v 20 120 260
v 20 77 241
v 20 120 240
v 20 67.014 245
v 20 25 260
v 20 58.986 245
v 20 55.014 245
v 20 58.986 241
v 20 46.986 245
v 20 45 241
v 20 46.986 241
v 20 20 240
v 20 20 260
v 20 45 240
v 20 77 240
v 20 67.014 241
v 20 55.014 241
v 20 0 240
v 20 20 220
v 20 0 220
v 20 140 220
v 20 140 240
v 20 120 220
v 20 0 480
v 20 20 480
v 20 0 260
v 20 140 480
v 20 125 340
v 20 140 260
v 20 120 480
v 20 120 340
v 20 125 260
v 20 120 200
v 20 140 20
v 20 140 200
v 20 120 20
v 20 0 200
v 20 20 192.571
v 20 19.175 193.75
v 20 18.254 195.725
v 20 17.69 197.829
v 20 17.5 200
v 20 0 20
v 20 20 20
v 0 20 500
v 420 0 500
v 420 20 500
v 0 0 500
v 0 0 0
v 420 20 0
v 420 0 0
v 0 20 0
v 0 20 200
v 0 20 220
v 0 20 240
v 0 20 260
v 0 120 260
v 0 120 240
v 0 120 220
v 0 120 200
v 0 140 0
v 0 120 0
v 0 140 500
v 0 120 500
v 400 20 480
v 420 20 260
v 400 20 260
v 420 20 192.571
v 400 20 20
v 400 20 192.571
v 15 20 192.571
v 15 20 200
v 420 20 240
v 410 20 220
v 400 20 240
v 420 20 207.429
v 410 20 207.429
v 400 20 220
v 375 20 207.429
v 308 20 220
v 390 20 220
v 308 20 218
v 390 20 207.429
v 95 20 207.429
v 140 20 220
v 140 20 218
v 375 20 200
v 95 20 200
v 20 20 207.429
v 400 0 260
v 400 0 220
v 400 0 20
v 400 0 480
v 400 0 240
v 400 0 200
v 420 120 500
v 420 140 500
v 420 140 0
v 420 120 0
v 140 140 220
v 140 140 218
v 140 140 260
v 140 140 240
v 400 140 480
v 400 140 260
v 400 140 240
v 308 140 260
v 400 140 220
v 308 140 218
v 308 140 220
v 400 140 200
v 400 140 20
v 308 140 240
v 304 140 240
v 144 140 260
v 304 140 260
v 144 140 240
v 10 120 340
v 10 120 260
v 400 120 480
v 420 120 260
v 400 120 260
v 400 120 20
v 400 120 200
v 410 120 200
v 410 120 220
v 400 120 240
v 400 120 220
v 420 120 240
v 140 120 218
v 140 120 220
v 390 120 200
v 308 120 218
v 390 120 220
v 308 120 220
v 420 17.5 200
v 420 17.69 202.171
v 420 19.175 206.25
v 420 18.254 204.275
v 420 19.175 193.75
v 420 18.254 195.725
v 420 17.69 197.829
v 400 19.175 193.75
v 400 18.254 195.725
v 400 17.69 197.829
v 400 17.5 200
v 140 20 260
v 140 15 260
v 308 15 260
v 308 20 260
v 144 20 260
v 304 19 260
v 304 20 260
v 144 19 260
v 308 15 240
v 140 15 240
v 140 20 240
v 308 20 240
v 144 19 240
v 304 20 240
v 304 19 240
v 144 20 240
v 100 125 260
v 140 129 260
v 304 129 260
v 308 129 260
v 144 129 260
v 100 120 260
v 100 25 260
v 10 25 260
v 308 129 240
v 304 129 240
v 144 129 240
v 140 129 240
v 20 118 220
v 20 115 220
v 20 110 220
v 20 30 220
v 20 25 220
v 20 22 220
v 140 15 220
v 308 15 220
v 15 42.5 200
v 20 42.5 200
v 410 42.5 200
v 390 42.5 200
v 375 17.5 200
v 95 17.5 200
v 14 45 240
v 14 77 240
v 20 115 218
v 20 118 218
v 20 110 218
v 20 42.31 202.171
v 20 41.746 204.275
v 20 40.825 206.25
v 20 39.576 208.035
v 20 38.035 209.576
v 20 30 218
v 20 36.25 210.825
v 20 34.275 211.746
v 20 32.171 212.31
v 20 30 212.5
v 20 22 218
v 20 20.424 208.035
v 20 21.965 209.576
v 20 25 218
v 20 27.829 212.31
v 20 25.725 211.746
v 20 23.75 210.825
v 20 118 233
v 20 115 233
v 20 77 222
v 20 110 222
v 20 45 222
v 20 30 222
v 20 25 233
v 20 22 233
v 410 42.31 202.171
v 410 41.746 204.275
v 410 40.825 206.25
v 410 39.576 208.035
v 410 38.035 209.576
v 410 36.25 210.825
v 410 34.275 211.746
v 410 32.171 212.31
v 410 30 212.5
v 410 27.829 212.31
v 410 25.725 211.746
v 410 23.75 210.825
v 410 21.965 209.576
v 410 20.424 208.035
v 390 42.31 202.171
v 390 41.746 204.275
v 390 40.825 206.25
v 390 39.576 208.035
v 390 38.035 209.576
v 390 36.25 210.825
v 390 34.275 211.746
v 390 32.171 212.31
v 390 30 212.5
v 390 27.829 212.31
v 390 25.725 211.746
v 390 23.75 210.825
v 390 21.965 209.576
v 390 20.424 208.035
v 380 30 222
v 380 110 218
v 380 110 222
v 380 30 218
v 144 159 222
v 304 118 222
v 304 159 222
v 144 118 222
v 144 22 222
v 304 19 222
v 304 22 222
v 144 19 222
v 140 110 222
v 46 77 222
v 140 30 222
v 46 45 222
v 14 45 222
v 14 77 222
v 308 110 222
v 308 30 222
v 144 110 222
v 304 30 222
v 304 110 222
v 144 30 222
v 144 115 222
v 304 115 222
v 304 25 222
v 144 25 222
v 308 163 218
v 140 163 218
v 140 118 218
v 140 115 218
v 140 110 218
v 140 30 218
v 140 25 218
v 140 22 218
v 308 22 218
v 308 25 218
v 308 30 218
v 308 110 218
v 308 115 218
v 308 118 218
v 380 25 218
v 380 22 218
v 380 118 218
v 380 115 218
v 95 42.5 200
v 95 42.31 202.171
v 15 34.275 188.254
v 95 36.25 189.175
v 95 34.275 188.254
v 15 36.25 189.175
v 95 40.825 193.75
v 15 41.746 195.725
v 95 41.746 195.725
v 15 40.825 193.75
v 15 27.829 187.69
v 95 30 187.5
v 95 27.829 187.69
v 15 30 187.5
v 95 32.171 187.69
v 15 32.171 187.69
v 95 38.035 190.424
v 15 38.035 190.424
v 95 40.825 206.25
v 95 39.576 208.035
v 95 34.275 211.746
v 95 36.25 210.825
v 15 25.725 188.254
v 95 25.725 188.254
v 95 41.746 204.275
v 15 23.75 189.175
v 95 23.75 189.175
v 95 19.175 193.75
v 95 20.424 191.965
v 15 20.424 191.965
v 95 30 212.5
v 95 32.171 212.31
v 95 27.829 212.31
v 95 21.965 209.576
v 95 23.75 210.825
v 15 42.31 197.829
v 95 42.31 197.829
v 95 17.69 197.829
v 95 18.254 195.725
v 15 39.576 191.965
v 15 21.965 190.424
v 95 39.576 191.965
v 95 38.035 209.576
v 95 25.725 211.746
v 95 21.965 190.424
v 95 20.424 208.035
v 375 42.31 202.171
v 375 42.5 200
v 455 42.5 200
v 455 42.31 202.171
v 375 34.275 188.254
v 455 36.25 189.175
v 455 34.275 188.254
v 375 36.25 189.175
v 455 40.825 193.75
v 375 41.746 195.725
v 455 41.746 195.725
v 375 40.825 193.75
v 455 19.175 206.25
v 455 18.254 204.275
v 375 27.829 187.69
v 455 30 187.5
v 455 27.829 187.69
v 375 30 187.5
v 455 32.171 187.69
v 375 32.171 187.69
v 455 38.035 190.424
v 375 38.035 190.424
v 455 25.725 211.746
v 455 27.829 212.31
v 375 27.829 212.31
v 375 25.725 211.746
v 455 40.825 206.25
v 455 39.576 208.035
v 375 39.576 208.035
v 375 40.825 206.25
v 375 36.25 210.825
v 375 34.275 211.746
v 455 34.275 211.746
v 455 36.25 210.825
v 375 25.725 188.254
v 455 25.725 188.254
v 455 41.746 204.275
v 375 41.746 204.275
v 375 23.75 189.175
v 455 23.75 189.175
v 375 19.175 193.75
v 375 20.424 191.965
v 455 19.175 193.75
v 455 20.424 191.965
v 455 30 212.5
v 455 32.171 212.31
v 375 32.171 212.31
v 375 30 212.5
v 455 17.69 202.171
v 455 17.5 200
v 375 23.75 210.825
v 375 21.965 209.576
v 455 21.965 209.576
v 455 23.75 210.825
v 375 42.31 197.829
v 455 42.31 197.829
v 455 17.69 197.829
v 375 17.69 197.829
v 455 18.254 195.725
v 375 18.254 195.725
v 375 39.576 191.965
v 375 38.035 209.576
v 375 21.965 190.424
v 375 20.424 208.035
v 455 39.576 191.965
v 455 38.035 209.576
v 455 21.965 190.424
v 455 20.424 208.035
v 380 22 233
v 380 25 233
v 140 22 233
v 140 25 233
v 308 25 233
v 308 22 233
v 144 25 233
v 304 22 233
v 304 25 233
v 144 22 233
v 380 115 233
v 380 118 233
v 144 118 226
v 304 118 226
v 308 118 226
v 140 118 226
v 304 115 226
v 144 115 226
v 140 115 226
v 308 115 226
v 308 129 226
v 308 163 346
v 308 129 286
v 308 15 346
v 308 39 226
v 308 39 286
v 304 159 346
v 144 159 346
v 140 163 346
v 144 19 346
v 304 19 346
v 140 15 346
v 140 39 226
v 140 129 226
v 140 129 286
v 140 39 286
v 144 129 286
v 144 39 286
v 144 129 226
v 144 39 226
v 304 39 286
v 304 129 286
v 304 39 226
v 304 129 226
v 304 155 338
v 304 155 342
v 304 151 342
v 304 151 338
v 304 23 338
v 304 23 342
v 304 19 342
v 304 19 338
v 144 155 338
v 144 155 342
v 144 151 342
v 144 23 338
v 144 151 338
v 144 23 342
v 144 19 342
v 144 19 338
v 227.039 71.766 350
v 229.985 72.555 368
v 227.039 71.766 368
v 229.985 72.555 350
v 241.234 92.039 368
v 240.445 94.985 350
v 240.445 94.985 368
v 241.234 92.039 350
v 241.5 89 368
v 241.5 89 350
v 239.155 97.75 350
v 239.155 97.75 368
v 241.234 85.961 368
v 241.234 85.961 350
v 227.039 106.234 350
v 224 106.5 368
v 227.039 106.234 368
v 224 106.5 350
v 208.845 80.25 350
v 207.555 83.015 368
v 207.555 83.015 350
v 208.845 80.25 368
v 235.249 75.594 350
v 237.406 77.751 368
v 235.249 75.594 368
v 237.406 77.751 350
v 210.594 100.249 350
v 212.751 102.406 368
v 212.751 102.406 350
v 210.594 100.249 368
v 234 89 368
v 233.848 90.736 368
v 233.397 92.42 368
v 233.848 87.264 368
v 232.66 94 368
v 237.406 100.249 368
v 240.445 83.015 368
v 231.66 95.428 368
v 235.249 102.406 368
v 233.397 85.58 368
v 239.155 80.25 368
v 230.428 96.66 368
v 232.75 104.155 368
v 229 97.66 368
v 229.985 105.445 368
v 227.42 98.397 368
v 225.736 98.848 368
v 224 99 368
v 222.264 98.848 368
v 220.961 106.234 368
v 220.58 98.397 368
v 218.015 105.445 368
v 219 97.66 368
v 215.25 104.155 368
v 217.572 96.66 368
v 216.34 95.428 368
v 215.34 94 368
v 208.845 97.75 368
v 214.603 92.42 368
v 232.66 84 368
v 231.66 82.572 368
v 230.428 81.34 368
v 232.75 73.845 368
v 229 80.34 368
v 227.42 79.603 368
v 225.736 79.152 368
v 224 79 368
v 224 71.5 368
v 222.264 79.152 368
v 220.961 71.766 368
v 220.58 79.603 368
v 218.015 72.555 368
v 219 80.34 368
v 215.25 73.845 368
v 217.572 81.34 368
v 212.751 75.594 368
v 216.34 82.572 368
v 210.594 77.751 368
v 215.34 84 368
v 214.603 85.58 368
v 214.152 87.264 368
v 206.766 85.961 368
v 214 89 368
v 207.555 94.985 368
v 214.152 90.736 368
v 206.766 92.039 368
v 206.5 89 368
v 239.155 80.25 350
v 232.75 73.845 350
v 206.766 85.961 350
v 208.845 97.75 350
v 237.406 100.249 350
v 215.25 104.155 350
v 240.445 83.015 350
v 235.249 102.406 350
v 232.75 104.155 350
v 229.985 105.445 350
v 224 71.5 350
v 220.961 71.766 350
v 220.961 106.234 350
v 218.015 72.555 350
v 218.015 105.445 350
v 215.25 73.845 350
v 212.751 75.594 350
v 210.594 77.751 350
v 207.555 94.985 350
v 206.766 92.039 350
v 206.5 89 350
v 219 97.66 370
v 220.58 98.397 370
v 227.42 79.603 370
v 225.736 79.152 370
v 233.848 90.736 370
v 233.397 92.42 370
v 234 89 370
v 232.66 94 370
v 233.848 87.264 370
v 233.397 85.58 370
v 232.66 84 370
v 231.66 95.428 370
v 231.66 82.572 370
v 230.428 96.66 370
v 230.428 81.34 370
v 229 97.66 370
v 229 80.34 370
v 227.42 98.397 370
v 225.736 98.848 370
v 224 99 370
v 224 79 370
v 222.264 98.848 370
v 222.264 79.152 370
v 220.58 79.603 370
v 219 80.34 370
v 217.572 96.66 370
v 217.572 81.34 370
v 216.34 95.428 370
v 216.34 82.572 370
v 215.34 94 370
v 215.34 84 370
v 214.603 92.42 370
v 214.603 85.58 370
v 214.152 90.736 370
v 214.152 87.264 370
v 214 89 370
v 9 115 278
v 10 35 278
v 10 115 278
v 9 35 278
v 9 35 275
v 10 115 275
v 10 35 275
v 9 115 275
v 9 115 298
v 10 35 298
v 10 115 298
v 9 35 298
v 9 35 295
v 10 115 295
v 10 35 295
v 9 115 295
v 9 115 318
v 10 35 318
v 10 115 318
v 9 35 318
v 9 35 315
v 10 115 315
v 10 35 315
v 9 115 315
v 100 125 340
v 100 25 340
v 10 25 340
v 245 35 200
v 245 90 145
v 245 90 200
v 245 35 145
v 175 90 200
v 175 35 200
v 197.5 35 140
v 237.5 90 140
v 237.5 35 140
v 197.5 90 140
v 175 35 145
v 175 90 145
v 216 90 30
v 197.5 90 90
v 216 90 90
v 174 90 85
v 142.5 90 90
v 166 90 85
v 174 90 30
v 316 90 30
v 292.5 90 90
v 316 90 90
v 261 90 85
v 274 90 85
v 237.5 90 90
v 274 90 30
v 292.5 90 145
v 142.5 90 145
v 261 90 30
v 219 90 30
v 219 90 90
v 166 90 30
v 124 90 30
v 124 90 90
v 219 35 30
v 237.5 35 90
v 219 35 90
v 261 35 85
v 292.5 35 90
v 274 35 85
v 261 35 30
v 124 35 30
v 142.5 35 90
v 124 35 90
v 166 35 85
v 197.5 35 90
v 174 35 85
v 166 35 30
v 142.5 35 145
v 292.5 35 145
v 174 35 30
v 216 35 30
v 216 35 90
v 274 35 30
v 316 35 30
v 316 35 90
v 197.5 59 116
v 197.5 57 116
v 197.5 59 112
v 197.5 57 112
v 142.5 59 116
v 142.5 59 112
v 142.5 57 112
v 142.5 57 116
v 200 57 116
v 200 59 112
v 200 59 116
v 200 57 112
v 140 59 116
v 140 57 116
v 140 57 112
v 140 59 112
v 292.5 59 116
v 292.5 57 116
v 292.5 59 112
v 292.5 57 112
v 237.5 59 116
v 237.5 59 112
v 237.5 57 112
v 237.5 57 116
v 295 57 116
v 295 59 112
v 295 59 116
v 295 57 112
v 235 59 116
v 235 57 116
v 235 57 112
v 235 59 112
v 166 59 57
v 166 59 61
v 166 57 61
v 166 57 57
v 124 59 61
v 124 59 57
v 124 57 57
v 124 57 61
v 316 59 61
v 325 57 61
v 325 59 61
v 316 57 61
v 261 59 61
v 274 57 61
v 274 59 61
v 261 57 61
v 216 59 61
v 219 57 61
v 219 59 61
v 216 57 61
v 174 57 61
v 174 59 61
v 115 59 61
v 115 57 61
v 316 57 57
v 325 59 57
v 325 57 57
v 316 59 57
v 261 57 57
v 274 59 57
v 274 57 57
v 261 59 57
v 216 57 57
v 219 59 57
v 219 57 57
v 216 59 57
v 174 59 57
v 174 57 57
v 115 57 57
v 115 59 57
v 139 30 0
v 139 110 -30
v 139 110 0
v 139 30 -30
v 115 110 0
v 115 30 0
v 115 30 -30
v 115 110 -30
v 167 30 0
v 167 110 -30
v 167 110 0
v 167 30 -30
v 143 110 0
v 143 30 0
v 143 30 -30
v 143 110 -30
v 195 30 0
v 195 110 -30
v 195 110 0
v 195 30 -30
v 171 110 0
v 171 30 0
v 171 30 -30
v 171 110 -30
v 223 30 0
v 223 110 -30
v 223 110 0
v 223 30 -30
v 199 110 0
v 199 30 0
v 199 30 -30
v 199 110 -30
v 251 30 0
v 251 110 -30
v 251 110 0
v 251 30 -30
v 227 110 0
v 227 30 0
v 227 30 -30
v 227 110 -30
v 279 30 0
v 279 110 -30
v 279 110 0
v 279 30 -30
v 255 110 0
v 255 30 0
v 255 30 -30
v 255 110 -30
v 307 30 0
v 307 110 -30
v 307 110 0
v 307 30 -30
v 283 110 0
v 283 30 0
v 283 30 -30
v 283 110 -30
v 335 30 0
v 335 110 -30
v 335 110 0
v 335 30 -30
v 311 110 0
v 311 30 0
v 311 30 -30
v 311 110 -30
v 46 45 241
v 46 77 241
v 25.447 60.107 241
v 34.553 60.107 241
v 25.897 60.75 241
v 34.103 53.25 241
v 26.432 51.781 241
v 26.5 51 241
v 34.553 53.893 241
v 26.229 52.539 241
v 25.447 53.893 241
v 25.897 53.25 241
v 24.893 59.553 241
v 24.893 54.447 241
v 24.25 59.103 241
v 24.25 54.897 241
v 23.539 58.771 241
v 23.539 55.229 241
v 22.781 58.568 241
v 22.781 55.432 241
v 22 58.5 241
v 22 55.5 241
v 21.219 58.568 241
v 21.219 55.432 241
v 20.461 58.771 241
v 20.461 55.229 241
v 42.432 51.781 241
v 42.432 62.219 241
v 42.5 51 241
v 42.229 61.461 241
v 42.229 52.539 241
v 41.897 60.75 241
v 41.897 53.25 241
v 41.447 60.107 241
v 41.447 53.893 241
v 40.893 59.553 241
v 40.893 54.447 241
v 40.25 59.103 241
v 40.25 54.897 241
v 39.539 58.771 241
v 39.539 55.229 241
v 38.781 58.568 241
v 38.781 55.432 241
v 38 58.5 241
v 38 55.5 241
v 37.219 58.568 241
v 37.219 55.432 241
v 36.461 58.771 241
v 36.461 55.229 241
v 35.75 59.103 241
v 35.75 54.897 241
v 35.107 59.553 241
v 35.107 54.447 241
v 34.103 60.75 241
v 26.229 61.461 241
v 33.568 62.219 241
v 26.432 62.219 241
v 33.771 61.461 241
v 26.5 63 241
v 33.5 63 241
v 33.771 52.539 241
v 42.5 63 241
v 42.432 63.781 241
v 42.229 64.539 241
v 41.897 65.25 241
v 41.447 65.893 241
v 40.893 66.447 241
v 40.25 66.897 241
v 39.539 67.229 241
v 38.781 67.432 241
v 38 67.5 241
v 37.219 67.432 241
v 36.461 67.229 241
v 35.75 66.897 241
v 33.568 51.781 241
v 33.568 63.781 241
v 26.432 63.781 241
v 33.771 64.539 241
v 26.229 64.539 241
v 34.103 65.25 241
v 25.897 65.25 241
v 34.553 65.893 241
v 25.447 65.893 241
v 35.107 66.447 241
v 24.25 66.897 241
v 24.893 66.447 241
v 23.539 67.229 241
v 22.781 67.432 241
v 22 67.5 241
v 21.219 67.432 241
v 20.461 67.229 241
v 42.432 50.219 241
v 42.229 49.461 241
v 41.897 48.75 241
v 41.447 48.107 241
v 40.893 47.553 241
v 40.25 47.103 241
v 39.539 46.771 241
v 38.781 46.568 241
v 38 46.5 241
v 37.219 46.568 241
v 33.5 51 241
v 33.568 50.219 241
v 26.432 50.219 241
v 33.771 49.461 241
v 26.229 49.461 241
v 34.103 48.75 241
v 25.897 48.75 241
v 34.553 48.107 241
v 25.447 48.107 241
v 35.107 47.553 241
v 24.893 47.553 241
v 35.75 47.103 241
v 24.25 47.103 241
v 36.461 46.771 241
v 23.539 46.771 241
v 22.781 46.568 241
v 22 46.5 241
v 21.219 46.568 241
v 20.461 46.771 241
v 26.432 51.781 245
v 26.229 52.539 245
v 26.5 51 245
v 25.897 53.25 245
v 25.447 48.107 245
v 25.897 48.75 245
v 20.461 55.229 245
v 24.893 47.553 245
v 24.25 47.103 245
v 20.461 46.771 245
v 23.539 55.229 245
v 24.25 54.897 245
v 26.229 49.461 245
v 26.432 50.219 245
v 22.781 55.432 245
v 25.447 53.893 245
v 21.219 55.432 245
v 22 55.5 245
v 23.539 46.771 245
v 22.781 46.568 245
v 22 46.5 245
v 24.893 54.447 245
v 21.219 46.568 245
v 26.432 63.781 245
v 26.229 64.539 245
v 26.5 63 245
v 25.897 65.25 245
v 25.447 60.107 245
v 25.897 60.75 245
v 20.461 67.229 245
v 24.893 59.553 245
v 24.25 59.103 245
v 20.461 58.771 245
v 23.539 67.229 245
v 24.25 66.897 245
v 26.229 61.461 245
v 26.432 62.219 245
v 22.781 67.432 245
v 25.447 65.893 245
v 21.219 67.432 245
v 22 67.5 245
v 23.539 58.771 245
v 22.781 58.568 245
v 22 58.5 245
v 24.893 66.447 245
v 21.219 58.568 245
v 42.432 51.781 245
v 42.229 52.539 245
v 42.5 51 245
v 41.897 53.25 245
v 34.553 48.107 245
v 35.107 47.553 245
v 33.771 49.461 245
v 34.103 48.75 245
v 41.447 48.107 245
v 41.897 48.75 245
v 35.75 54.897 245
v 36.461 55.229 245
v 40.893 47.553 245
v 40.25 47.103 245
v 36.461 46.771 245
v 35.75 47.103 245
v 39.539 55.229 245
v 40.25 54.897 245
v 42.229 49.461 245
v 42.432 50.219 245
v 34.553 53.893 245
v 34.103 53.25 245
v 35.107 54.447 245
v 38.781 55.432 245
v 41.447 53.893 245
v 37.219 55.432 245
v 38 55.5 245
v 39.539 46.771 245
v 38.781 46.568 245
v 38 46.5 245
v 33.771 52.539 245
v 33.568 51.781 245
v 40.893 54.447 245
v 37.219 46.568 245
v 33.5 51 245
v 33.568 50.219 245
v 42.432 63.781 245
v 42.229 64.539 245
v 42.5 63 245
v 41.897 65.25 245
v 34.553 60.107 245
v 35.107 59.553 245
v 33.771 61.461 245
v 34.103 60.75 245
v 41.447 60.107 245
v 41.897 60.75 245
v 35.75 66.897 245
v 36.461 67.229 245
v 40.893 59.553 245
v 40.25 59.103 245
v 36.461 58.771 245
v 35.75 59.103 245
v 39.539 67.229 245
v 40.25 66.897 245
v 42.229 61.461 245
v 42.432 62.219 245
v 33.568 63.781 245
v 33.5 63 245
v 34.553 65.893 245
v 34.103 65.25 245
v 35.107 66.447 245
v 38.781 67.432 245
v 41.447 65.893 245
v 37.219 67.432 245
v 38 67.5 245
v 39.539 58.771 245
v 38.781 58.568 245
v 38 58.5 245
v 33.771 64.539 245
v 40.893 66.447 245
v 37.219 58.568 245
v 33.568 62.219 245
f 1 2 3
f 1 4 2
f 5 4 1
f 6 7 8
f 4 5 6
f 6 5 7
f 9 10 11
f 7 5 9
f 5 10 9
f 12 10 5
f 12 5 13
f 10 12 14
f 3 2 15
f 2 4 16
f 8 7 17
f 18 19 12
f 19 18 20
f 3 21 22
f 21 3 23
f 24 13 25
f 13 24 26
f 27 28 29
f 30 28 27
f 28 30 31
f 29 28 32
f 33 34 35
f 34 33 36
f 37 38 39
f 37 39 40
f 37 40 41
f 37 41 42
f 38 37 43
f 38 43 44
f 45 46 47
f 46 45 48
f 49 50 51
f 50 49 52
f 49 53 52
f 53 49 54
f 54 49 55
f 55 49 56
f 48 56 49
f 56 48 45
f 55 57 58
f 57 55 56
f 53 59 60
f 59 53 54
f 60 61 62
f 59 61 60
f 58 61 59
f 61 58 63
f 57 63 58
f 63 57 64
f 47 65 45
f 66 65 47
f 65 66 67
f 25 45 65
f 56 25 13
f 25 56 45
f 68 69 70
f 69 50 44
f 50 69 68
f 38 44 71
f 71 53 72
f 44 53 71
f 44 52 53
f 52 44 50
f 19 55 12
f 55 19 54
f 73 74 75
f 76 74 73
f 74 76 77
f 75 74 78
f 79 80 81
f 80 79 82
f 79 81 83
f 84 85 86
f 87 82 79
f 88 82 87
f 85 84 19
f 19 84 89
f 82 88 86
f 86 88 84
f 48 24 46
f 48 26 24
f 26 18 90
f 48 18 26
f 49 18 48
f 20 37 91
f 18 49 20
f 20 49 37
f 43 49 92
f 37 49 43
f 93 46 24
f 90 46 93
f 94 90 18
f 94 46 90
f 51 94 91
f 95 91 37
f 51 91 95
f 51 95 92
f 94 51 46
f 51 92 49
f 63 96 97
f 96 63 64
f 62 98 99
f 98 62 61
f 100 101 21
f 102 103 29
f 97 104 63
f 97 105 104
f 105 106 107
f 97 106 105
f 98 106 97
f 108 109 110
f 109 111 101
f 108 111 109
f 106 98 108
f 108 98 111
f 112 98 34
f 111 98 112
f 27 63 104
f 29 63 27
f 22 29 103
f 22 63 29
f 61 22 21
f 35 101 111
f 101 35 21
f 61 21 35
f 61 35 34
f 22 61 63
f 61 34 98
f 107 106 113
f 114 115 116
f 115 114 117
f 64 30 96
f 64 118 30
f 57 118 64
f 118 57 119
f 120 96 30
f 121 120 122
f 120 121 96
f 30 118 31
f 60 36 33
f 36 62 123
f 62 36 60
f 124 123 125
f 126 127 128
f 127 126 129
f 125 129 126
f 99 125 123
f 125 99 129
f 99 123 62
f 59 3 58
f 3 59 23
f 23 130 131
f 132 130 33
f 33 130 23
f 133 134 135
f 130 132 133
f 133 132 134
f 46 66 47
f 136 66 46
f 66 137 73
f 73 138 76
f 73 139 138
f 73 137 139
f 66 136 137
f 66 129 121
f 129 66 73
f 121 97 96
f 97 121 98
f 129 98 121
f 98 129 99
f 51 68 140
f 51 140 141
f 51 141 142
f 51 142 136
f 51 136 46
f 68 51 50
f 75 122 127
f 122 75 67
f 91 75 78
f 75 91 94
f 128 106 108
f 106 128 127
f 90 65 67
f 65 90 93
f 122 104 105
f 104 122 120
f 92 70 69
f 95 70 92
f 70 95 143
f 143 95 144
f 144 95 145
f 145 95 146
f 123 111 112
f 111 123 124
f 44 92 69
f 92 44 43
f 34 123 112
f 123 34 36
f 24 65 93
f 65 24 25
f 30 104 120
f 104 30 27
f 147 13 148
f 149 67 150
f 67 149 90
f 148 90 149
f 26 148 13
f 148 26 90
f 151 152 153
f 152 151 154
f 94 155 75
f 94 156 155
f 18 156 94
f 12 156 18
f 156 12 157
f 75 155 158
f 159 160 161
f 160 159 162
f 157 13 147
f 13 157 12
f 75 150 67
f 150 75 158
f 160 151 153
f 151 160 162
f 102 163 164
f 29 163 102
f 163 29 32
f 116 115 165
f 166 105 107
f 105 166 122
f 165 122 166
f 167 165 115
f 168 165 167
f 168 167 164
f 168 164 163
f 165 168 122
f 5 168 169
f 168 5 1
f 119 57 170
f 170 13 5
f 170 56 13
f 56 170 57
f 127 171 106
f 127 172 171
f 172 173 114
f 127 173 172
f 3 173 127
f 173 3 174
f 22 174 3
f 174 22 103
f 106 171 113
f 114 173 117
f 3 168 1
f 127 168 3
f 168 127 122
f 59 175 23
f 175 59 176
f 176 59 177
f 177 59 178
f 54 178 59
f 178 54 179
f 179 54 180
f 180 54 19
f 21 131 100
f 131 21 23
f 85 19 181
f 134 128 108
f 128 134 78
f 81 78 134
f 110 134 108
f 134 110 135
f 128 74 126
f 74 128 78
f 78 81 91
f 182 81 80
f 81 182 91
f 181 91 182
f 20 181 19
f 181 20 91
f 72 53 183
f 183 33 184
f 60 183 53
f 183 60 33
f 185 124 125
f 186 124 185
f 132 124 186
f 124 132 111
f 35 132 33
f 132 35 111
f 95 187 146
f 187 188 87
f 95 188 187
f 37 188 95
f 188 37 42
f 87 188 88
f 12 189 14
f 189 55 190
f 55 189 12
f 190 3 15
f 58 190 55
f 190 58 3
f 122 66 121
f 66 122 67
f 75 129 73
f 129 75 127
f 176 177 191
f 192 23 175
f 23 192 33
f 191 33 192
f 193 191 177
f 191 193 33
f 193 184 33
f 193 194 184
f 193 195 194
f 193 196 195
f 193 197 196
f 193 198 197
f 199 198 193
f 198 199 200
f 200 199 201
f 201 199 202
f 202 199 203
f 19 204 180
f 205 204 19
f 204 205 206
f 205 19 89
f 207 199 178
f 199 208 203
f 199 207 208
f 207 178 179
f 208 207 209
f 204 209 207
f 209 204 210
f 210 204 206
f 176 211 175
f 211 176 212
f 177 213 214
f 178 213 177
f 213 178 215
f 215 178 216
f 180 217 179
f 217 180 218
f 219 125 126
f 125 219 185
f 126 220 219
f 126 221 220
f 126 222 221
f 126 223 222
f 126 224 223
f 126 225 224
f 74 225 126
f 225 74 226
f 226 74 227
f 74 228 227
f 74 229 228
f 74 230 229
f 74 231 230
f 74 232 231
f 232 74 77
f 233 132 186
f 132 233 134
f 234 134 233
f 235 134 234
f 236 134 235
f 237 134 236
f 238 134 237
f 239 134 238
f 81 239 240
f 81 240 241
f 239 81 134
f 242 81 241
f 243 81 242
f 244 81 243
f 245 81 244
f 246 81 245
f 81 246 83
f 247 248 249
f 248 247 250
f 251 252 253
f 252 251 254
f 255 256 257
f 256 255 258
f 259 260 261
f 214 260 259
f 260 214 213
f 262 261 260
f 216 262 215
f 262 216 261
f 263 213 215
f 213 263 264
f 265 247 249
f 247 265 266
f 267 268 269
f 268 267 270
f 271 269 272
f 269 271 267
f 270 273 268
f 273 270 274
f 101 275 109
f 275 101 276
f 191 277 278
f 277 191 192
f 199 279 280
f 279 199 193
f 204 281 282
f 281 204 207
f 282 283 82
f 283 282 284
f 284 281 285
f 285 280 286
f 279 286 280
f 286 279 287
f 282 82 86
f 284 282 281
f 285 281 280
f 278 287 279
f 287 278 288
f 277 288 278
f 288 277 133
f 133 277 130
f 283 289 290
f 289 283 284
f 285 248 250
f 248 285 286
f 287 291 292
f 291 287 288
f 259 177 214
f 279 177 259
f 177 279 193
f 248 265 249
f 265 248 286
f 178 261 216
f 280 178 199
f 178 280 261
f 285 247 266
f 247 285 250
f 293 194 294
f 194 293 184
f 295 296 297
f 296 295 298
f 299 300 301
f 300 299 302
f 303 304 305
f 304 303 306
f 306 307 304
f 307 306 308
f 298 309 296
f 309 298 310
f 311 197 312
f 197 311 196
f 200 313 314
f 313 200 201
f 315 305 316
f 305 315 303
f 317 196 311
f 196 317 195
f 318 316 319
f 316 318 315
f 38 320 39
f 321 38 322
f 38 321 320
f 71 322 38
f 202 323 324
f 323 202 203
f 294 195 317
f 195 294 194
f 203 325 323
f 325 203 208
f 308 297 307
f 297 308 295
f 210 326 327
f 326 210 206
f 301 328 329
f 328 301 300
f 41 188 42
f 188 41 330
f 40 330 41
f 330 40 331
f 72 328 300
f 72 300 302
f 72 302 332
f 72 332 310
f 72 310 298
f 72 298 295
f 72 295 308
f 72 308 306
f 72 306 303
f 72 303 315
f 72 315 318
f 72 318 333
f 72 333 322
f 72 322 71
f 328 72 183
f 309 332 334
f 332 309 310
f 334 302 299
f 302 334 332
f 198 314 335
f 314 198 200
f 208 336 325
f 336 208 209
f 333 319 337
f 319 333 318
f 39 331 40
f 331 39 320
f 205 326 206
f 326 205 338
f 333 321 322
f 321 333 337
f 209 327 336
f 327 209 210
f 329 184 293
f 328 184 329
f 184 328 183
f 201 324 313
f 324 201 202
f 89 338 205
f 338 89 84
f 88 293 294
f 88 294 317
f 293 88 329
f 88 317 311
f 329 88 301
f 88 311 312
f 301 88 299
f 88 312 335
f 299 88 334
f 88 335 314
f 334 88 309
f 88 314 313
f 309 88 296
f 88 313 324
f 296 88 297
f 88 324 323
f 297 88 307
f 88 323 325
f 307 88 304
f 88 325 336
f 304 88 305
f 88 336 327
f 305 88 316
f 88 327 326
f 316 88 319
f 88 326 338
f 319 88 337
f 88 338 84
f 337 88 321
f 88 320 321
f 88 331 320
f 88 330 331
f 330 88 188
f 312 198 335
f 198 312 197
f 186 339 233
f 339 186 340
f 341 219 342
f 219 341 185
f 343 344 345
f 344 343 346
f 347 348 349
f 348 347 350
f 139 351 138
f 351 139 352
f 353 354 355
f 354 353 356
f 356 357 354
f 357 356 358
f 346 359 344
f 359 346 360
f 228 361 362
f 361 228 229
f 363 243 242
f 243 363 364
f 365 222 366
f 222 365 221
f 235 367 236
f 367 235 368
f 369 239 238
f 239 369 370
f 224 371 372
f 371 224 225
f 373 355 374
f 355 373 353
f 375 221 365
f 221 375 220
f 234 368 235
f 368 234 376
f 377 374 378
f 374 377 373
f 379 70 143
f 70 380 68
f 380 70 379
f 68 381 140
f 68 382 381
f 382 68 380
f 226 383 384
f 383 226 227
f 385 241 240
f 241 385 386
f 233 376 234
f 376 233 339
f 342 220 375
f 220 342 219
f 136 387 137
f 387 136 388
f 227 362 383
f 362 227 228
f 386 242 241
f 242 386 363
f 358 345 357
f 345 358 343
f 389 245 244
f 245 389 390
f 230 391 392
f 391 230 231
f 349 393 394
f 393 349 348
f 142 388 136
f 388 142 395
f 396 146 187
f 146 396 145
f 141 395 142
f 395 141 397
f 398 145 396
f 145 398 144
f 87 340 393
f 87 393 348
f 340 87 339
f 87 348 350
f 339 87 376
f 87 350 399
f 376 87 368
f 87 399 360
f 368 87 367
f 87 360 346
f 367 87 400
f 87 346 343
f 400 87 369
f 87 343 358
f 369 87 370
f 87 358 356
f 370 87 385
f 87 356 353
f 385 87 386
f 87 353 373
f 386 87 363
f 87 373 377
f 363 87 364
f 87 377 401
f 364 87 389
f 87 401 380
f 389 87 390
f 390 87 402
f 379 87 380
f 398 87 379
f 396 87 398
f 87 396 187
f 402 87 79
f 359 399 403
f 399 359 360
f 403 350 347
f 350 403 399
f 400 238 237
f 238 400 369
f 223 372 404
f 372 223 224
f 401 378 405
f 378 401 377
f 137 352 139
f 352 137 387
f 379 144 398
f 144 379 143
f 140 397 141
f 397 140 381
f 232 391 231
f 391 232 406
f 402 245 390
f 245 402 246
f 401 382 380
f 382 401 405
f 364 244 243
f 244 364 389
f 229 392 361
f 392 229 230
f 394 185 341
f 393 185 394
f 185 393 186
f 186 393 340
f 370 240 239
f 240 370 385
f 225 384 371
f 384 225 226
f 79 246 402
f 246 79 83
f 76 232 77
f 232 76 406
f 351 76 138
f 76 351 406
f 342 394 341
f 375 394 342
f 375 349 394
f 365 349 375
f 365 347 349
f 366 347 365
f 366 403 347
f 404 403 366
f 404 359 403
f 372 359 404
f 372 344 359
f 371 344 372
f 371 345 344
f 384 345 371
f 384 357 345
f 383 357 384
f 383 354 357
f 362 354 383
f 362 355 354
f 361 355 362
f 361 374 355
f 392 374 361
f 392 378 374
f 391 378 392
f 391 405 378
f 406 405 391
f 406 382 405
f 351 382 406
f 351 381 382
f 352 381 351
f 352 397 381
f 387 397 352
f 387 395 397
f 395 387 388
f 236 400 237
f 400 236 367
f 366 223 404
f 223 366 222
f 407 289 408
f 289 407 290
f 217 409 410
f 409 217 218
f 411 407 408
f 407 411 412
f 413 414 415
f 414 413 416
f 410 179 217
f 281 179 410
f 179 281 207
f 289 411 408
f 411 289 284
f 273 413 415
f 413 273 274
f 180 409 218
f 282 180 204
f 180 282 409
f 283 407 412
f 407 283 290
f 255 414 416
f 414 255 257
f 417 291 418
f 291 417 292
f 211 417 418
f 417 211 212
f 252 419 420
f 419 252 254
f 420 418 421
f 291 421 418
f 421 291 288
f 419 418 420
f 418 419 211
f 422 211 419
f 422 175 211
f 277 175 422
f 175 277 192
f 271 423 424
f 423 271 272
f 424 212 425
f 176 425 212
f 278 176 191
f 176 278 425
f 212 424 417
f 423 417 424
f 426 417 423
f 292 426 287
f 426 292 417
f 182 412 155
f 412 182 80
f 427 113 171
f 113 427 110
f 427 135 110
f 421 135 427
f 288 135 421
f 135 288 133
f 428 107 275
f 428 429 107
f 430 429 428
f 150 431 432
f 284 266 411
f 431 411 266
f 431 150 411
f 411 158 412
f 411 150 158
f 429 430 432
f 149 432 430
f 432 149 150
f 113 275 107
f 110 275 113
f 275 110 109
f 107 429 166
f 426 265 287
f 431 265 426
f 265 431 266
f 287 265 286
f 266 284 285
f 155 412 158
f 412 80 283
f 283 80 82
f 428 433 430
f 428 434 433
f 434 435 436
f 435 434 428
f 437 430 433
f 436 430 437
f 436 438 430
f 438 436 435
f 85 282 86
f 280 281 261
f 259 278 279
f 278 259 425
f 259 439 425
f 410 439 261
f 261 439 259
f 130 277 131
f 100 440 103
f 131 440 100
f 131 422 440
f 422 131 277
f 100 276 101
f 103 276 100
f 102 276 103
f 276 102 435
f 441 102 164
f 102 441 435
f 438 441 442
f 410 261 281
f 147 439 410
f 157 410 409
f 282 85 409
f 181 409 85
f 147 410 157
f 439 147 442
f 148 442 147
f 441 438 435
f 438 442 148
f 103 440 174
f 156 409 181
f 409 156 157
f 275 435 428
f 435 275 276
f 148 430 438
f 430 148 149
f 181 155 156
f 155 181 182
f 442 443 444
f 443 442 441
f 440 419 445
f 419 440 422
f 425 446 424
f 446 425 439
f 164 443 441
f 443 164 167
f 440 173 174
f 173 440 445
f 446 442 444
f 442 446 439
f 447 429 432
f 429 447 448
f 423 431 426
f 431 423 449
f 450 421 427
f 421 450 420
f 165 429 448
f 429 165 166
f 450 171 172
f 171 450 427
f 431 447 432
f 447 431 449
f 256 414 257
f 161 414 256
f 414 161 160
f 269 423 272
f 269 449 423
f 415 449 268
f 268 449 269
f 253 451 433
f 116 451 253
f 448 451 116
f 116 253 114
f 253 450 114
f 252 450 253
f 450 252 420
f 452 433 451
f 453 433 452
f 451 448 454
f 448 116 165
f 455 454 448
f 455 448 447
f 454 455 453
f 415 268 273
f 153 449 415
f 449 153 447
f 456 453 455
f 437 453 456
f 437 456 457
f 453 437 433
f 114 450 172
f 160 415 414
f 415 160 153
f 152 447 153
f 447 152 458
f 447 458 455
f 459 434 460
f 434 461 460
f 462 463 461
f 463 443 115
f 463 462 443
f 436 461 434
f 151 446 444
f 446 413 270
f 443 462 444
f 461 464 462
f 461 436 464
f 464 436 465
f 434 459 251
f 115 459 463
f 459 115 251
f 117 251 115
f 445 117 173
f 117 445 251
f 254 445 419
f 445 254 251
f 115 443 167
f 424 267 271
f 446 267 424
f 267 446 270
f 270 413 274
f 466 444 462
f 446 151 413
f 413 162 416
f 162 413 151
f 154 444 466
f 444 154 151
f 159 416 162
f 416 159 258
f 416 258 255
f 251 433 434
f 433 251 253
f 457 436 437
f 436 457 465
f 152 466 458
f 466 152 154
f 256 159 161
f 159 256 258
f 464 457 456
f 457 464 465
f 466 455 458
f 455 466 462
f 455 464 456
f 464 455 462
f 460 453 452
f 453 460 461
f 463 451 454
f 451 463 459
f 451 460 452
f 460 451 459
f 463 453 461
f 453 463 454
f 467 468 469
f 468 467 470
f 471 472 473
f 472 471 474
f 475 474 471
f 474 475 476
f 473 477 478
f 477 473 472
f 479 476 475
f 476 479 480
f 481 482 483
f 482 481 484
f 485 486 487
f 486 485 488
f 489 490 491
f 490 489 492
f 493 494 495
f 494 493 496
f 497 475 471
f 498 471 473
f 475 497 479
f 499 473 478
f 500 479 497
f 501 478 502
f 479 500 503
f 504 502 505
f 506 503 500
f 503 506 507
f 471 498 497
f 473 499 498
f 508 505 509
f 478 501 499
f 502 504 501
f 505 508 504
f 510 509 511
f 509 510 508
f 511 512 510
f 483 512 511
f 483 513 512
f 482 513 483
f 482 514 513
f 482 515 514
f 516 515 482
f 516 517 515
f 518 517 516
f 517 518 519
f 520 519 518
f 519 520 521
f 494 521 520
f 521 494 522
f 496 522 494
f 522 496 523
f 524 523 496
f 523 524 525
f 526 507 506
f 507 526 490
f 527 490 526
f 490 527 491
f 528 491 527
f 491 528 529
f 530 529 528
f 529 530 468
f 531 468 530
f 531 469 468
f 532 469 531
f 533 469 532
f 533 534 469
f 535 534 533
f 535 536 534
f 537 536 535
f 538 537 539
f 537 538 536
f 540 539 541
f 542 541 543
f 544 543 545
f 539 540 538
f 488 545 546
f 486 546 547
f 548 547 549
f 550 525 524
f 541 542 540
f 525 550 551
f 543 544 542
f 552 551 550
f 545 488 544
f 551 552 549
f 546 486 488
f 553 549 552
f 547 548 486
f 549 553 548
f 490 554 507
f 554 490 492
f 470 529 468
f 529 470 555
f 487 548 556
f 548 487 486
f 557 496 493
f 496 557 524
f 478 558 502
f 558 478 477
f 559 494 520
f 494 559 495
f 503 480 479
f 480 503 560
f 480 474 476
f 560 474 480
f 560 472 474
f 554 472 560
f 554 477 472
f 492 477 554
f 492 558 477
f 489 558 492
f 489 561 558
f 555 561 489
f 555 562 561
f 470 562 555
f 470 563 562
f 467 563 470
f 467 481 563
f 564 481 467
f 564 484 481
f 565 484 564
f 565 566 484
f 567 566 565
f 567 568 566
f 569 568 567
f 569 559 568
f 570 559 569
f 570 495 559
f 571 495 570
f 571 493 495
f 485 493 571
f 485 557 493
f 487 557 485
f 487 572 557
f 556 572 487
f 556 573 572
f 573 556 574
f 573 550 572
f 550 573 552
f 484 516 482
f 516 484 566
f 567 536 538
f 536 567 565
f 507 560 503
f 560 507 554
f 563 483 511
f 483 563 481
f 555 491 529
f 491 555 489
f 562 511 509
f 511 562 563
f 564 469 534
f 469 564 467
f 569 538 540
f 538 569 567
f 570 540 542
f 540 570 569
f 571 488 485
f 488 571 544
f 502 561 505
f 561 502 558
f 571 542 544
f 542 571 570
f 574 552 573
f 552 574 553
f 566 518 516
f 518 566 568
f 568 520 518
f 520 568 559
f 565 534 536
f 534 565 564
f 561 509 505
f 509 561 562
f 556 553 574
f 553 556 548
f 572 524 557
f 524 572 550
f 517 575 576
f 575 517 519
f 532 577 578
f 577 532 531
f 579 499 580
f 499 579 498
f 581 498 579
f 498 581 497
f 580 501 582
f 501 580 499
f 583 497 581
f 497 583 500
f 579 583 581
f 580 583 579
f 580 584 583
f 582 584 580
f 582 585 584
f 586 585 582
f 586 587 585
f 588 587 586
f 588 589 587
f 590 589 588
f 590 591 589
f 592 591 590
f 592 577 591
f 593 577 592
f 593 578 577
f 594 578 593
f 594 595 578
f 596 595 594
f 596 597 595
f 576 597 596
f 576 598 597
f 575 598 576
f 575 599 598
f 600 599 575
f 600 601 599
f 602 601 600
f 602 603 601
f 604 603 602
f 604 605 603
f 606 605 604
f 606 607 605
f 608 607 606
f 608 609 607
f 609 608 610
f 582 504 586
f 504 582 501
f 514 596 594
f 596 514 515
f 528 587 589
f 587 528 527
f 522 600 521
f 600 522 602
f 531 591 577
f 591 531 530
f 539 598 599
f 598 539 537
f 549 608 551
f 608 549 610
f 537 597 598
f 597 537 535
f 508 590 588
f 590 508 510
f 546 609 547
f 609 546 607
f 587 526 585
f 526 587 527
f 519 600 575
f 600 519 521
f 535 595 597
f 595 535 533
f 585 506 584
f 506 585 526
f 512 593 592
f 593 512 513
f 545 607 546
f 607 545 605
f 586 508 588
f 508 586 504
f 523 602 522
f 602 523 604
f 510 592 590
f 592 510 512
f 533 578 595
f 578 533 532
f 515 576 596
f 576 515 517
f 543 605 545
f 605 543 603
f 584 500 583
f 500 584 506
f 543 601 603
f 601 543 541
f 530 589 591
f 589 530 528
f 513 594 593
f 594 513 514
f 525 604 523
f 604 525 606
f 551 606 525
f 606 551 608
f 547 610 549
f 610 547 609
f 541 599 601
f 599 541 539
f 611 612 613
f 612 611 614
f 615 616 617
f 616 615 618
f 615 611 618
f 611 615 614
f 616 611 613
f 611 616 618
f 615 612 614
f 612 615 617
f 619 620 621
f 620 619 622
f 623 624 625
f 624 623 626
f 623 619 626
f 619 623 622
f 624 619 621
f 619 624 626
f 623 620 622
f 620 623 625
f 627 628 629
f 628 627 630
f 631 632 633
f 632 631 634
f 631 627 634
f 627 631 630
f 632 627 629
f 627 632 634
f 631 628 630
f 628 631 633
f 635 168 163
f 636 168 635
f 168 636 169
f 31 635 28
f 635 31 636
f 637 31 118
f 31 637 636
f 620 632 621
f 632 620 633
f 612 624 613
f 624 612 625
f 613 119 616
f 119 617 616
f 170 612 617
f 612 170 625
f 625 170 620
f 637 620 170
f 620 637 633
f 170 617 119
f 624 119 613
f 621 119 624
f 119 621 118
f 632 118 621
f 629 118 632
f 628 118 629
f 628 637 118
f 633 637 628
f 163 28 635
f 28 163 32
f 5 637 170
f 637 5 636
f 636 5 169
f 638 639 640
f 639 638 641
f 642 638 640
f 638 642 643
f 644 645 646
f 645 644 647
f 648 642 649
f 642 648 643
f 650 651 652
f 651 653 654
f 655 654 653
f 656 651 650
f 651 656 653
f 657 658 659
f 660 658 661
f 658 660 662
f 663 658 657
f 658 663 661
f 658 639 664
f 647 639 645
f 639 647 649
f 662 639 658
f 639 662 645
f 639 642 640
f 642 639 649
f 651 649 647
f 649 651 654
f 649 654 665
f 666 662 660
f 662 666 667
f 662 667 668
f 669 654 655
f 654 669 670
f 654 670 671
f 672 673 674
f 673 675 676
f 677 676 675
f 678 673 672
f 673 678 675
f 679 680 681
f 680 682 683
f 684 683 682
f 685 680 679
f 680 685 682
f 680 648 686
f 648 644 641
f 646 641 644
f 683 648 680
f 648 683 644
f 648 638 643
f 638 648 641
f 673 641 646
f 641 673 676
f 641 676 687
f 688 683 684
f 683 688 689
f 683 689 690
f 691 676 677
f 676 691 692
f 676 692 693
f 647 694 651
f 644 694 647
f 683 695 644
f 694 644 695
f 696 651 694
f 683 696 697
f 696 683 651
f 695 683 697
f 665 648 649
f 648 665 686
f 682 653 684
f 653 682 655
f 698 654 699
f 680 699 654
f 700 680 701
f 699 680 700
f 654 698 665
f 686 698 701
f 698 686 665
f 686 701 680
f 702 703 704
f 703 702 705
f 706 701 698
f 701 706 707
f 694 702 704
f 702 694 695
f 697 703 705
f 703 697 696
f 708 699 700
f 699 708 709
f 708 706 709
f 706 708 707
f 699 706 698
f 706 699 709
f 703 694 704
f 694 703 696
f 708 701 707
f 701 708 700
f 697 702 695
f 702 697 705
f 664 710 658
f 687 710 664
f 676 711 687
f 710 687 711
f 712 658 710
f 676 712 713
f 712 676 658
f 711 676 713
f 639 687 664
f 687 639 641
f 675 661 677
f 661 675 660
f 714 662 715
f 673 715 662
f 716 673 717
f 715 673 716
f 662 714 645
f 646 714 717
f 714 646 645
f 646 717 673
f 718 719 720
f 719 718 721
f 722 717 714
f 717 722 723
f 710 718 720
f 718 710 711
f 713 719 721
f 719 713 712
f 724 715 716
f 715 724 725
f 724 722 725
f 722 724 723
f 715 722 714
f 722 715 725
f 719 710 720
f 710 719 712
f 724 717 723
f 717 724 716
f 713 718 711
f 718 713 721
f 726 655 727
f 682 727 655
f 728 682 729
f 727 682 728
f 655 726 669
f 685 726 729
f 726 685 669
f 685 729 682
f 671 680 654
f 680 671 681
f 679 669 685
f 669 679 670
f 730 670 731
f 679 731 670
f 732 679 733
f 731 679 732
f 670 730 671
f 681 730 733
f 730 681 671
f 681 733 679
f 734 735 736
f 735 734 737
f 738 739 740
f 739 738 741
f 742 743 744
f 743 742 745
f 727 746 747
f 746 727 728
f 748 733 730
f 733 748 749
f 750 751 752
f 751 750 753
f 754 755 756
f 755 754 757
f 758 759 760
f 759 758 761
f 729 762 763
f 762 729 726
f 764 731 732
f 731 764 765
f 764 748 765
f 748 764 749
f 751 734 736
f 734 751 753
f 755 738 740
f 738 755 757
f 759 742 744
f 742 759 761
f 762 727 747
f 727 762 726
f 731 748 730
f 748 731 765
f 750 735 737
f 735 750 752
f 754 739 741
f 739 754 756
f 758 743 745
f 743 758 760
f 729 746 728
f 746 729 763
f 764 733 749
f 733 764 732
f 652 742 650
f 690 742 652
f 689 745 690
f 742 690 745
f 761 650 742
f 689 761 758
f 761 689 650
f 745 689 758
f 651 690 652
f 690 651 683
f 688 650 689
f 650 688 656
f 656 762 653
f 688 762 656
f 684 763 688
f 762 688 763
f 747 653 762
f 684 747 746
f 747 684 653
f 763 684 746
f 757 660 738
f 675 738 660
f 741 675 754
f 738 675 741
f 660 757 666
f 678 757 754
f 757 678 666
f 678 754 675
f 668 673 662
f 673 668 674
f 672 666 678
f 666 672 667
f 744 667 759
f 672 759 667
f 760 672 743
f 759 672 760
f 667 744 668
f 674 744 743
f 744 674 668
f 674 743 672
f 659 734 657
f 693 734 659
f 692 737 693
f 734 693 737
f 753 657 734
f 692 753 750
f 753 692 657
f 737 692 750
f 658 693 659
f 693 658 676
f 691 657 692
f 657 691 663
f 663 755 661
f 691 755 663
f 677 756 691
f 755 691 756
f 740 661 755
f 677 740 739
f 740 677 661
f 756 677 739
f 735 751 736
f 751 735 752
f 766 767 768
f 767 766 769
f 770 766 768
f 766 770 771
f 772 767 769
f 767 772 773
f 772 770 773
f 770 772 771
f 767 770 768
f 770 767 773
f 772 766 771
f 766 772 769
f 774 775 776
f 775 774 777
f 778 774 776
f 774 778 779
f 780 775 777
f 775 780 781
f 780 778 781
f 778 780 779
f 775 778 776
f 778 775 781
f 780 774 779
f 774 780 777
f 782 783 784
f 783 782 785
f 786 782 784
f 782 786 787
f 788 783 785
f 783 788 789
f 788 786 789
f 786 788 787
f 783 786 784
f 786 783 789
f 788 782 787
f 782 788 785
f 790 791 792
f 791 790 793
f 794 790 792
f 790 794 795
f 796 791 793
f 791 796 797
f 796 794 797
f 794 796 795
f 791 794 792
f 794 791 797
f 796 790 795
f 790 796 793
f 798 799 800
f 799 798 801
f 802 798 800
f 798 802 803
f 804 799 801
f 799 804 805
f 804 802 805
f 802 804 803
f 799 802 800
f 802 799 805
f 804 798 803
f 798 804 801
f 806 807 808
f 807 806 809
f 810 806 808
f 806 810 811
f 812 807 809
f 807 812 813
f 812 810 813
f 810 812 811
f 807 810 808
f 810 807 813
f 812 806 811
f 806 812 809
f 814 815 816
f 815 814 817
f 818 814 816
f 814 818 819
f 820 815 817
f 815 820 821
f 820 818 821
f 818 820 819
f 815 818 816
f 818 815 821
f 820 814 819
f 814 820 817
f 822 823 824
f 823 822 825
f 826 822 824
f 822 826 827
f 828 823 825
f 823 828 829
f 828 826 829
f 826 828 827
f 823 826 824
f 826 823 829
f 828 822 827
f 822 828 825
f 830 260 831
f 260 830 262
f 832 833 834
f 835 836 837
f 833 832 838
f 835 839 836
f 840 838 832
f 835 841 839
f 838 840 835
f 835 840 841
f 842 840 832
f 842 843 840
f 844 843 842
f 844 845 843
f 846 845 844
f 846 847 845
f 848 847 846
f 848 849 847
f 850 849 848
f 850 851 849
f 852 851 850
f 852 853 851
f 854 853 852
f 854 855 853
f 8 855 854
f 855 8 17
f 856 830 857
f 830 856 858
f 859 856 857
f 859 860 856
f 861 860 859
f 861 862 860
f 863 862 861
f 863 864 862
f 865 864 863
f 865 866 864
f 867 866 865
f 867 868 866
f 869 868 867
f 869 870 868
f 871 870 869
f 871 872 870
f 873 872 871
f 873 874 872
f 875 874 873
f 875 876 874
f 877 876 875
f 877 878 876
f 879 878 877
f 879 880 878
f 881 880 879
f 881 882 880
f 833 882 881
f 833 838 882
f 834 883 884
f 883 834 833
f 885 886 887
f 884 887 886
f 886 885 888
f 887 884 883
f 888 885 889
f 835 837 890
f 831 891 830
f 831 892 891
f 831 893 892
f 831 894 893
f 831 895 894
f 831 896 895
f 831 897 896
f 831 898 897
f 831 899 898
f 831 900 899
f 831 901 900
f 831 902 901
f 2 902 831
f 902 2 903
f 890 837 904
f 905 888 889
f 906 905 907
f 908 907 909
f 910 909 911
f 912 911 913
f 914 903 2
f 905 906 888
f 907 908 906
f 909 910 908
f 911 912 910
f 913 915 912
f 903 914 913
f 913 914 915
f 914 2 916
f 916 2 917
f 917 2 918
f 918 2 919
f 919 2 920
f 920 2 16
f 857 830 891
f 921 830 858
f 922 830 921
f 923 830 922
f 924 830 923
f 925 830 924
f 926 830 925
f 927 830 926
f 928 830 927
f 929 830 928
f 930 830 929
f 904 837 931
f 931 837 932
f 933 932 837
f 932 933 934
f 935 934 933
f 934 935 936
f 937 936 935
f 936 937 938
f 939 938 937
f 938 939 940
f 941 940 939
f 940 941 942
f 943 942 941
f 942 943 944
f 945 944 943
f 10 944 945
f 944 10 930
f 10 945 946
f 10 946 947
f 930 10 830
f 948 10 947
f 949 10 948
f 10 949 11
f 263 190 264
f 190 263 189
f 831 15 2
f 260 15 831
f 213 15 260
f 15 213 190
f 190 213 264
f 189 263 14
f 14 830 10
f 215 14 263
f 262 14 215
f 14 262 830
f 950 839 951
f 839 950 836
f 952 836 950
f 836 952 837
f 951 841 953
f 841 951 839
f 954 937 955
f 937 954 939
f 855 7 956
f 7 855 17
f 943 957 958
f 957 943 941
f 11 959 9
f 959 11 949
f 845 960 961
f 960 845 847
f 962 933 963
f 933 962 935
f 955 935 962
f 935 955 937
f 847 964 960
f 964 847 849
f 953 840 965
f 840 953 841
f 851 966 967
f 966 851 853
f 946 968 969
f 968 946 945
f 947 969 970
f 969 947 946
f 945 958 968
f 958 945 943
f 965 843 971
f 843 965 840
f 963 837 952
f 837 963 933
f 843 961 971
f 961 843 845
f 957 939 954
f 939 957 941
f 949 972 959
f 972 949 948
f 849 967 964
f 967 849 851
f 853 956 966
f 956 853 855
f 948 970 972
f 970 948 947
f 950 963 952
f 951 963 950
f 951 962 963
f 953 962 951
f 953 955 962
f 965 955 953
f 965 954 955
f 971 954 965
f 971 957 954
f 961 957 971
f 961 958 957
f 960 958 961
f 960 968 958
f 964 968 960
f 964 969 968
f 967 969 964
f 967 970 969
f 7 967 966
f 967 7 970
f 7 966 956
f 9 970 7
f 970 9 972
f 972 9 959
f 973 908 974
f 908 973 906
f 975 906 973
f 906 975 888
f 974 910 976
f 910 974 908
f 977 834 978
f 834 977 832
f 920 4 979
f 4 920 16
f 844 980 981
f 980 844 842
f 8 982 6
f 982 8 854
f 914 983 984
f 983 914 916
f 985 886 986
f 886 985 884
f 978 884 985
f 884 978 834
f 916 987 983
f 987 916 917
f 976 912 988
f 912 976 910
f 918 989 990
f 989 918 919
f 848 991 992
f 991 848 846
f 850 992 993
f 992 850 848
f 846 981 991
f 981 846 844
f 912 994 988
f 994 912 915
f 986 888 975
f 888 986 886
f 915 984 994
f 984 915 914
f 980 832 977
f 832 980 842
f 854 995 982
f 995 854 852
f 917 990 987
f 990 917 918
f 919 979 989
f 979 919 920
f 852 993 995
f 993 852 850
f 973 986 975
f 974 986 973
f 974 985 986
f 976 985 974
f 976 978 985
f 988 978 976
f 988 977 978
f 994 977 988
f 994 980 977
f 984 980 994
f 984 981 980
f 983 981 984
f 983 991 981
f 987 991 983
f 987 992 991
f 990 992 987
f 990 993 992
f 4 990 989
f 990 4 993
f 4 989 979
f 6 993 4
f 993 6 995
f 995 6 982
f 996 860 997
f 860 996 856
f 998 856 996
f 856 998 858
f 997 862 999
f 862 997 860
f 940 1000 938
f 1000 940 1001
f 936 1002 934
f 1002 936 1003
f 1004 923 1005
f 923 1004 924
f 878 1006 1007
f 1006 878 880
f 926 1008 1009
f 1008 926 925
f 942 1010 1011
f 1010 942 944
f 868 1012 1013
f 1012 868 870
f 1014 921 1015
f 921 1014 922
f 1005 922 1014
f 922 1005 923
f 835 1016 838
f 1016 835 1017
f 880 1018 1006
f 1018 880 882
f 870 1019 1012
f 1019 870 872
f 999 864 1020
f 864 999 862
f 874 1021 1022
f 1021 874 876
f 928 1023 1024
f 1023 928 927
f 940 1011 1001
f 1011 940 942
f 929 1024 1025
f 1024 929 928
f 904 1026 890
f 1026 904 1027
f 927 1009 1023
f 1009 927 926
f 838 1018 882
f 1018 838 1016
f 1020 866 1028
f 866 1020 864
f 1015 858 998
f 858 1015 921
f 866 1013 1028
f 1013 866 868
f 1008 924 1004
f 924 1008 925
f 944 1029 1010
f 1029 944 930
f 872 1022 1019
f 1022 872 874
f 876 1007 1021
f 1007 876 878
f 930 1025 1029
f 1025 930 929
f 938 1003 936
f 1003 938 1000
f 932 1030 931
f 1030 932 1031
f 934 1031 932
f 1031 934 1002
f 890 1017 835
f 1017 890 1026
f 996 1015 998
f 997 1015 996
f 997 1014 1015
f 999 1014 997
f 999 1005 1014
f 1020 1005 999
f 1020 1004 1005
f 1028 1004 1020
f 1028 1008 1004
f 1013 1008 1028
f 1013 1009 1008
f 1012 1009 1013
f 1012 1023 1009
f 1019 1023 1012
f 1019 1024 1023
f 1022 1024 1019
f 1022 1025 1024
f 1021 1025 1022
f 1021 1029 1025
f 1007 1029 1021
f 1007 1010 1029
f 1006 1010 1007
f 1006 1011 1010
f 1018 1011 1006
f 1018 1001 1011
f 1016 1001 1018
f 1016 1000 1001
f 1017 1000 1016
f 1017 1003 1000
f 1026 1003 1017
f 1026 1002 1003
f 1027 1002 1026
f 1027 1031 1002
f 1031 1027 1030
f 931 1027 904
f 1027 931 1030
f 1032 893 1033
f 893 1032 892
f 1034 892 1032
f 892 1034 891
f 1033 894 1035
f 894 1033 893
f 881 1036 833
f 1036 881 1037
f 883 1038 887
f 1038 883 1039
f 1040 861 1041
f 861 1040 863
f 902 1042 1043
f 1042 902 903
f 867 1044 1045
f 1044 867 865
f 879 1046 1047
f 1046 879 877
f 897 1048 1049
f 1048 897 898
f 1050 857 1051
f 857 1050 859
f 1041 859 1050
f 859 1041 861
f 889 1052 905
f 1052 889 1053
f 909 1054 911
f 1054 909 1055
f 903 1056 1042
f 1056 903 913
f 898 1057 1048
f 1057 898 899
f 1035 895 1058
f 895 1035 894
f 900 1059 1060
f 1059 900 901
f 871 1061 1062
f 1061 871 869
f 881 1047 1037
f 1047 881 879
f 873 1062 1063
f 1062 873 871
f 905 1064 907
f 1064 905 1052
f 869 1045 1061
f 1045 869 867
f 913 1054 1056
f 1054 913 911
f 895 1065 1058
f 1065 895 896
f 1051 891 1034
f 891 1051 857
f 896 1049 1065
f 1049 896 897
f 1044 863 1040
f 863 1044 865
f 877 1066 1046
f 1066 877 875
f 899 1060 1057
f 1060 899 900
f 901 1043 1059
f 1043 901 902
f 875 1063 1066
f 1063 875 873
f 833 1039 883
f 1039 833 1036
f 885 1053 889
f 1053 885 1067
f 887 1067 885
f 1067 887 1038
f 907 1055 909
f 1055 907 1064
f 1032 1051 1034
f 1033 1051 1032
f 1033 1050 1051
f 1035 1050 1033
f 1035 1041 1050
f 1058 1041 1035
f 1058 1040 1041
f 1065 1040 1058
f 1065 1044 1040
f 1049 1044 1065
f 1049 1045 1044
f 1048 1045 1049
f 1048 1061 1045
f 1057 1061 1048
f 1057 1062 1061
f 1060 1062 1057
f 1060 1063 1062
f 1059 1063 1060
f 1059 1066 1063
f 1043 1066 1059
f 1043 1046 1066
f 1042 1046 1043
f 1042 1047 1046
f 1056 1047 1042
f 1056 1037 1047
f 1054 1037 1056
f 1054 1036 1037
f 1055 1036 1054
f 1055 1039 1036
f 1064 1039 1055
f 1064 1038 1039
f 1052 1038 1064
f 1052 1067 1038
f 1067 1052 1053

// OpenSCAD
// ============================================================
// LEGO AI Sorting Machine — Brick Journey Animation
// Parametric frame driven by $t  (0.0 → 1.0)
//
// Stages (by $t):
//   0.00 – 0.18  Brick travels along belt towards chamber
//   0.18 – 0.30  Brick inside chamber, camera flash
//   0.30 – 0.42  Brick exits chamber, continues belt
//   0.42 – 0.55  Brick drops off belt end into gate tree
//   0.55 – 0.72  Gates actuate (root → level 2)
//   0.72 – 0.88  Brick falls through gate tree
//   0.88 – 1.00  Brick lands in output bin
// ============================================================

$fn = 36;

// ── HELPERS ────────────────────────────────────────────────
function lerp(a, b, t) = a + (b - a) * t;
function clamp(v, lo, hi) = max(lo, min(hi, v));
function remap(t, t0, t1) = clamp((t - t0) / (t1 - t0), 0, 1);

// ── COLOURS ────────────────────────────────────────────────
C_FRAME   = [0.55, 0.55, 0.55];
C_BELT    = [0.15, 0.15, 0.15];
C_ROLLER  = [0.2,  0.5,  1.0];
C_CHAMBER = [0.95, 0.95, 0.95];
C_CAM     = [0.1,  0.1,  0.1];
C_LED     = [1.0,  1.0,  0.5];
C_GATE    = [0.2,  0.7,  0.4];
C_SERVO   = [0.3,  0.3,  0.3];
C_ELEC    = [0.3,  0.5,  0.9];
C_BIN     = [0.9,  0.6,  0.2];
C_BRICK   = [0.95, 0.15, 0.15];  // bright red LEGO brick
C_FLASH   = [1.0,  1.0,  0.8];

// ── ANIMATION STATE ────────────────────────────────────────
// FRAME_T is set via -D on the command line (0.0 → 1.0)
FRAME_T = 0;   // default; overridden per frame
t = FRAME_T;

// Belt travel:  brick x goes from 30 → 390 (belt start to end)
// Camera flash: stage 0.18–0.30
// Gate actuation and brick drop happen after belt end

// Brick on belt (stages 0.0 → 0.42)
belt_t    = remap(t, 0.0, 0.42);
brick_bx  = lerp(30, 390, belt_t);   // x along belt
brick_bz  = 222;                      // sitting on belt surface

// Is brick in chamber? (x roughly 140–310, t 0.12–0.34)
in_chamber = (t >= 0.14 && t <= 0.36) ? 1 : 0;

// Flash intensity
flash_t   = remap(t, 0.18, 0.22);
flash_fade= remap(t, 0.26, 0.30);
flash     = clamp(flash_t - flash_fade, 0, 1);

// Brick drop from belt into gate tree (t 0.42 → 0.55)
drop_t    = remap(t, 0.42, 0.55);
brick_dx  = lerp(390, 290, drop_t);   // slides right to gate root x
brick_dz  = lerp(222, 160, drop_t);   // falls from belt to root gate

// Brick in gate tree (t 0.55 → 0.88)
// Route: root → right branch → right-right bin (bin 7)
fall_t    = remap(t, 0.55, 0.88);
brick_gx  = lerp(290, 310, fall_t);   // slight x drift right
brick_gz  = lerp(160, -20, fall_t);   // falls through tree to bins

// Final position in bin
in_bin    = t >= 0.88 ? 1 : 0;

// Brick position selector
brick_x = t < 0.42 ? brick_bx :
          t < 0.55 ? brick_dx :
          t < 0.88 ? brick_gx : 310;

brick_z = t < 0.42 ? brick_bz :
          t < 0.55 ? brick_dz :
          t < 0.88 ? brick_gz : -20;

// ── GATE ANGLES ────────────────────────────────────────────
// Gates actuate when brick approaches (t 0.55–0.72)
// Root gate rotates right (brick goes right)
gate0_t   = remap(t, 0.55, 0.63);
gate0_ang = lerp(0, 35, gate0_t);   // root flap angle

gate1_t   = remap(t, 0.63, 0.70);
gate1_ang = lerp(0, 35, gate1_t);   // level-1 right gate

gate2_t   = remap(t, 0.70, 0.76);
gate2_ang = lerp(0, 35, gate2_t);   // level-2 right-right gate

// ── FRAME ──────────────────────────────────────────────────
module extrusion(len, axis="x") {
    color(C_FRAME)
    if (axis == "x")      cube([len, 20, 20]);
    else if (axis == "y") cube([20, len, 20]);
    else                  cube([20, 20, len]);
}

module frame() {
    for (x = [0, 400]) for (y = [0, 120])
        translate([x, y, 0]) extrusion(500, "z");
    translate([0,   0,   0]) extrusion(420, "x");
    translate([0, 120,   0]) extrusion(420, "x");
    translate([0,   0, 480]) extrusion(420, "x");
    translate([0, 120, 480]) extrusion(420, "x");
    translate([0,   0, 240]) extrusion(420, "x");
    translate([0, 120, 240]) extrusion(420, "x");
    translate([0,   0, 200]) extrusion(420, "x");
    translate([0, 120, 200]) extrusion(420, "x");
    translate([0,   0, 240]) extrusion(140, "y");
    translate([400, 0, 240]) extrusion(140, "y");
    translate([0,  20, 200]) extrusion(100, "y");
    translate([390,20, 200]) extrusion(100, "y");
}

module belt_system() {
    color(C_BELT)   translate([20, 30, 218]) cube([360, 80, 4]);
    color(C_ROLLER) translate([15, 30, 200]) rotate([0,90,0]) cylinder(h=80,d=25);
    color(C_ROLLER) translate([375,30,200]) rotate([0,90,0]) cylinder(h=80,d=25);
    // side rails
    color([0.8,0.8,0.8]) translate([20, 22,218]) cube([360,3,15]);
    color([0.8,0.8,0.8]) translate([20,115,218]) cube([360,3,15]);
}

module scanning_chamber() {
    // Flash: brighten chamber interior when camera fires
    ci = lerp(0.7, 1.0, flash);
    color(C_CHAMBER, 0.55)
    translate([140, 15, 218])
        difference() {
            cube([168, 148, 128]);
            translate([-1, 24, 8]) cube([10, 90, 60]);
            translate([159,24, 8]) cube([10, 90, 60]);
            translate([4,  4,  4]) cube([160,140,130]);
        }
    // LED strips
    color([ci, ci, lerp(0.5,1.0,flash)], 0.9)
    translate([144, 19, 338]) cube([160, 4, 4]);
    color([ci, ci, lerp(0.5,1.0,flash)], 0.9)
    translate([144,151, 338]) cube([160, 4, 4]);
    // Camera
    color(C_CAM)   translate([224, 89, 350]) cylinder(h=18, d=35);
    color([0.0,0.2,0.8+flash*0.2], 0.7+flash*0.3)
    translate([224, 89, 366]) cylinder(h=4, d=20);
}

module electronics_box() {
    color(C_ELEC, 0.9) translate([10, 25, 260]) cube([90,100,80]);
    color([0.1,0.6,0.1])  translate([18, 35, 275]) cube([57,56,3]);
    color(C_FRAME)
    for (z=[275,295,315]) translate([9,35,z]) cube([2,80,3]);
}

// One gate module with animated flap
module gate_module(gx, gz, flap_angle, sz=70) {
    // Body
    color(C_GATE, 0.85) translate([gx-sz/2, 35, gz]) cube([sz, 55, 60]);
    // Servo
    color(C_SERVO) translate([gx-12, 70, gz+20]) cube([24,13,23]);
    // Animated flap
    color([0.9,0.9,0.9])
    translate([gx, 57, gz+29])
        rotate([0, flap_angle, 0])
            translate([-30, 0, -2])
                cube([60, 2, 4]);
}

module gate_tree() {
    gate_module(210, 140, gate0_ang, 70);  // root
    gate_module(170,  85, gate1_ang, 55);  // L1 left
    gate_module(265,  85, gate1_ang, 55);  // L1 right
    gate_module(145,  30, gate2_ang, 42);  // L2 ll
    gate_module(195,  30, gate2_ang, 42);  // L2 lr
    gate_module(240,  30, gate2_ang, 42);  // L2 rl
    gate_module(295,  30, gate2_ang, 42);  // L2 rr

    // Output bins
    for (i = [0:7])
        color(C_BIN, 0.85)
        translate([115 + i*28, 30, -30]) cube([24, 80, 30]);
}

// ── BRICK ──────────────────────────────────────────────────
module lego_brick(bx, bz) {
    // Body
    color(C_BRICK)
    translate([bx-16, 45, bz]) cube([32, 32, 19]);
    // Studs (2×2)
    color(C_BRICK)
    for (sx=[-8,8], sy=[51,63])
        translate([bx+sx, sy, bz+19]) cylinder(h=4, d=9);
}

// ── TRAIL (motion blur dots) ───────────────────────────────
module trail() {
    if (t < 0.42) {
        for (i=[1:4]) {
            trail_t = clamp(belt_t - i*0.04, 0, 1);
            tx = lerp(30, 390, trail_t);
            color(C_BRICK, (5-i)*0.1)
            translate([tx-16, 45, brick_bz]) cube([32,32,19]);
        }
    }
}

// ── RENDER ─────────────────────────────────────────────────
frame();
belt_system();
scanning_chamber();
electronics_box();
gate_tree();
trail();
lego_brick(brick_x, brick_z);
